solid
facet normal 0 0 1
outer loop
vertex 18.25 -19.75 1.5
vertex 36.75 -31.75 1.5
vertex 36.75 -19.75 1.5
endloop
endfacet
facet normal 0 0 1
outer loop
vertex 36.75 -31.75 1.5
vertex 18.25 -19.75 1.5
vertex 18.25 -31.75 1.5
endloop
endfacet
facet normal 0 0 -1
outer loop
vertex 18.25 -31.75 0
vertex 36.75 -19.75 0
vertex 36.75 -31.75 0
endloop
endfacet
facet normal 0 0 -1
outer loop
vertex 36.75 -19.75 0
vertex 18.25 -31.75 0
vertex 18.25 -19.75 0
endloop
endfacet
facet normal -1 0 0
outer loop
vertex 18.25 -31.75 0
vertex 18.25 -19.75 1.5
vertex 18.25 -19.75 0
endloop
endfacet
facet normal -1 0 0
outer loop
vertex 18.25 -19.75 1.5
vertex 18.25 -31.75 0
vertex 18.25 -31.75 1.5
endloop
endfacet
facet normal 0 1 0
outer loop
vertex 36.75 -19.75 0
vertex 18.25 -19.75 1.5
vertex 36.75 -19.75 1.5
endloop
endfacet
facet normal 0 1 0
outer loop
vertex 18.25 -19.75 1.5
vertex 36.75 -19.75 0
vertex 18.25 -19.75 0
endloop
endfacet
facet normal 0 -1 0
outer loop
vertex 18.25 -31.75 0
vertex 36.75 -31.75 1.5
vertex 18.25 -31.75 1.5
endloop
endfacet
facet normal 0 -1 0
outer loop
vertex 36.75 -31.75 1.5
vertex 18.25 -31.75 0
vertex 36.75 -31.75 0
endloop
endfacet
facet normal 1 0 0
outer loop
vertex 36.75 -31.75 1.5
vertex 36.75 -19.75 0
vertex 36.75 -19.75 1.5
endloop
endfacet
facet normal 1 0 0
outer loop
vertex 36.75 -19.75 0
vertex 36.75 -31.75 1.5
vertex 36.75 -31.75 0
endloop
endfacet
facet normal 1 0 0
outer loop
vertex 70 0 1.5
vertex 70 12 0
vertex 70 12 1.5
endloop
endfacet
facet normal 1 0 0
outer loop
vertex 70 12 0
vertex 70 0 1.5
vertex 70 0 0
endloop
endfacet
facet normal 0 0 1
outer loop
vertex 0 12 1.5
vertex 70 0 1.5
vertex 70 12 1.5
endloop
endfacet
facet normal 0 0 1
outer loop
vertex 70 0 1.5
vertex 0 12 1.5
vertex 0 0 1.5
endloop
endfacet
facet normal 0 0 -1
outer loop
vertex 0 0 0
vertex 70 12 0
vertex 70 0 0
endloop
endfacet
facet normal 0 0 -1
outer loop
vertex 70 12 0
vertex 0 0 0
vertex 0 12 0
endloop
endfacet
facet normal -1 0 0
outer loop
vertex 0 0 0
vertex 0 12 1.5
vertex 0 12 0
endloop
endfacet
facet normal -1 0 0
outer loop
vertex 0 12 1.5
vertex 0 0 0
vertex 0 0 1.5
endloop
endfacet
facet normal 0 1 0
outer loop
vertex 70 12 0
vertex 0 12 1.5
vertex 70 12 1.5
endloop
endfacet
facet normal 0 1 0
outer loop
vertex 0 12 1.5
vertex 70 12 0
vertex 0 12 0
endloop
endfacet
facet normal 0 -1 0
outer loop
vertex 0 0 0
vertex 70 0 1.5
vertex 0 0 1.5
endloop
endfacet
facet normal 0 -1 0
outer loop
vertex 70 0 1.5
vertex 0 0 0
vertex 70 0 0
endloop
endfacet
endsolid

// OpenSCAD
// 10-well agarose gel comb, printed flat
// Units: mm

$fn = 64;

// Plate
plate_len   = 70;   // spine length (X)
plate_wid   = 12;   // spine width (Y)
plate_thk   = 1.5;  // plate thickness (Z)

// Teeth
tooth_count = 10;   // number of teeth
tooth_w     = 5.0;  // tooth width (X)
tooth_l     = 12;   // tooth length (Y)
tooth_gap   = 1.5;  // gap between teeth (X)

// Derived
row_len    = (tooth_count - 1) * tooth_gap + tooth_count * tooth_w;  // 55 mm
overhang   = row_len / 2;                                            // centre offset in -Y

difference() {
    union() {
        // Spine
        translate([0, 0, 0])
            cube([plate_len, plate_wid, plate_thk]);

        // Teeth
        for (i = [0 : tooth_count - 1]) {
            x = (i - (tooth_count - 1) / 2) * tooth_gap + tooth_count * tooth_w / 2;
            translate([x, -overhang, 0])
                cube([tooth_w, tooth_l, plate_thk]);
        }
    }
}
